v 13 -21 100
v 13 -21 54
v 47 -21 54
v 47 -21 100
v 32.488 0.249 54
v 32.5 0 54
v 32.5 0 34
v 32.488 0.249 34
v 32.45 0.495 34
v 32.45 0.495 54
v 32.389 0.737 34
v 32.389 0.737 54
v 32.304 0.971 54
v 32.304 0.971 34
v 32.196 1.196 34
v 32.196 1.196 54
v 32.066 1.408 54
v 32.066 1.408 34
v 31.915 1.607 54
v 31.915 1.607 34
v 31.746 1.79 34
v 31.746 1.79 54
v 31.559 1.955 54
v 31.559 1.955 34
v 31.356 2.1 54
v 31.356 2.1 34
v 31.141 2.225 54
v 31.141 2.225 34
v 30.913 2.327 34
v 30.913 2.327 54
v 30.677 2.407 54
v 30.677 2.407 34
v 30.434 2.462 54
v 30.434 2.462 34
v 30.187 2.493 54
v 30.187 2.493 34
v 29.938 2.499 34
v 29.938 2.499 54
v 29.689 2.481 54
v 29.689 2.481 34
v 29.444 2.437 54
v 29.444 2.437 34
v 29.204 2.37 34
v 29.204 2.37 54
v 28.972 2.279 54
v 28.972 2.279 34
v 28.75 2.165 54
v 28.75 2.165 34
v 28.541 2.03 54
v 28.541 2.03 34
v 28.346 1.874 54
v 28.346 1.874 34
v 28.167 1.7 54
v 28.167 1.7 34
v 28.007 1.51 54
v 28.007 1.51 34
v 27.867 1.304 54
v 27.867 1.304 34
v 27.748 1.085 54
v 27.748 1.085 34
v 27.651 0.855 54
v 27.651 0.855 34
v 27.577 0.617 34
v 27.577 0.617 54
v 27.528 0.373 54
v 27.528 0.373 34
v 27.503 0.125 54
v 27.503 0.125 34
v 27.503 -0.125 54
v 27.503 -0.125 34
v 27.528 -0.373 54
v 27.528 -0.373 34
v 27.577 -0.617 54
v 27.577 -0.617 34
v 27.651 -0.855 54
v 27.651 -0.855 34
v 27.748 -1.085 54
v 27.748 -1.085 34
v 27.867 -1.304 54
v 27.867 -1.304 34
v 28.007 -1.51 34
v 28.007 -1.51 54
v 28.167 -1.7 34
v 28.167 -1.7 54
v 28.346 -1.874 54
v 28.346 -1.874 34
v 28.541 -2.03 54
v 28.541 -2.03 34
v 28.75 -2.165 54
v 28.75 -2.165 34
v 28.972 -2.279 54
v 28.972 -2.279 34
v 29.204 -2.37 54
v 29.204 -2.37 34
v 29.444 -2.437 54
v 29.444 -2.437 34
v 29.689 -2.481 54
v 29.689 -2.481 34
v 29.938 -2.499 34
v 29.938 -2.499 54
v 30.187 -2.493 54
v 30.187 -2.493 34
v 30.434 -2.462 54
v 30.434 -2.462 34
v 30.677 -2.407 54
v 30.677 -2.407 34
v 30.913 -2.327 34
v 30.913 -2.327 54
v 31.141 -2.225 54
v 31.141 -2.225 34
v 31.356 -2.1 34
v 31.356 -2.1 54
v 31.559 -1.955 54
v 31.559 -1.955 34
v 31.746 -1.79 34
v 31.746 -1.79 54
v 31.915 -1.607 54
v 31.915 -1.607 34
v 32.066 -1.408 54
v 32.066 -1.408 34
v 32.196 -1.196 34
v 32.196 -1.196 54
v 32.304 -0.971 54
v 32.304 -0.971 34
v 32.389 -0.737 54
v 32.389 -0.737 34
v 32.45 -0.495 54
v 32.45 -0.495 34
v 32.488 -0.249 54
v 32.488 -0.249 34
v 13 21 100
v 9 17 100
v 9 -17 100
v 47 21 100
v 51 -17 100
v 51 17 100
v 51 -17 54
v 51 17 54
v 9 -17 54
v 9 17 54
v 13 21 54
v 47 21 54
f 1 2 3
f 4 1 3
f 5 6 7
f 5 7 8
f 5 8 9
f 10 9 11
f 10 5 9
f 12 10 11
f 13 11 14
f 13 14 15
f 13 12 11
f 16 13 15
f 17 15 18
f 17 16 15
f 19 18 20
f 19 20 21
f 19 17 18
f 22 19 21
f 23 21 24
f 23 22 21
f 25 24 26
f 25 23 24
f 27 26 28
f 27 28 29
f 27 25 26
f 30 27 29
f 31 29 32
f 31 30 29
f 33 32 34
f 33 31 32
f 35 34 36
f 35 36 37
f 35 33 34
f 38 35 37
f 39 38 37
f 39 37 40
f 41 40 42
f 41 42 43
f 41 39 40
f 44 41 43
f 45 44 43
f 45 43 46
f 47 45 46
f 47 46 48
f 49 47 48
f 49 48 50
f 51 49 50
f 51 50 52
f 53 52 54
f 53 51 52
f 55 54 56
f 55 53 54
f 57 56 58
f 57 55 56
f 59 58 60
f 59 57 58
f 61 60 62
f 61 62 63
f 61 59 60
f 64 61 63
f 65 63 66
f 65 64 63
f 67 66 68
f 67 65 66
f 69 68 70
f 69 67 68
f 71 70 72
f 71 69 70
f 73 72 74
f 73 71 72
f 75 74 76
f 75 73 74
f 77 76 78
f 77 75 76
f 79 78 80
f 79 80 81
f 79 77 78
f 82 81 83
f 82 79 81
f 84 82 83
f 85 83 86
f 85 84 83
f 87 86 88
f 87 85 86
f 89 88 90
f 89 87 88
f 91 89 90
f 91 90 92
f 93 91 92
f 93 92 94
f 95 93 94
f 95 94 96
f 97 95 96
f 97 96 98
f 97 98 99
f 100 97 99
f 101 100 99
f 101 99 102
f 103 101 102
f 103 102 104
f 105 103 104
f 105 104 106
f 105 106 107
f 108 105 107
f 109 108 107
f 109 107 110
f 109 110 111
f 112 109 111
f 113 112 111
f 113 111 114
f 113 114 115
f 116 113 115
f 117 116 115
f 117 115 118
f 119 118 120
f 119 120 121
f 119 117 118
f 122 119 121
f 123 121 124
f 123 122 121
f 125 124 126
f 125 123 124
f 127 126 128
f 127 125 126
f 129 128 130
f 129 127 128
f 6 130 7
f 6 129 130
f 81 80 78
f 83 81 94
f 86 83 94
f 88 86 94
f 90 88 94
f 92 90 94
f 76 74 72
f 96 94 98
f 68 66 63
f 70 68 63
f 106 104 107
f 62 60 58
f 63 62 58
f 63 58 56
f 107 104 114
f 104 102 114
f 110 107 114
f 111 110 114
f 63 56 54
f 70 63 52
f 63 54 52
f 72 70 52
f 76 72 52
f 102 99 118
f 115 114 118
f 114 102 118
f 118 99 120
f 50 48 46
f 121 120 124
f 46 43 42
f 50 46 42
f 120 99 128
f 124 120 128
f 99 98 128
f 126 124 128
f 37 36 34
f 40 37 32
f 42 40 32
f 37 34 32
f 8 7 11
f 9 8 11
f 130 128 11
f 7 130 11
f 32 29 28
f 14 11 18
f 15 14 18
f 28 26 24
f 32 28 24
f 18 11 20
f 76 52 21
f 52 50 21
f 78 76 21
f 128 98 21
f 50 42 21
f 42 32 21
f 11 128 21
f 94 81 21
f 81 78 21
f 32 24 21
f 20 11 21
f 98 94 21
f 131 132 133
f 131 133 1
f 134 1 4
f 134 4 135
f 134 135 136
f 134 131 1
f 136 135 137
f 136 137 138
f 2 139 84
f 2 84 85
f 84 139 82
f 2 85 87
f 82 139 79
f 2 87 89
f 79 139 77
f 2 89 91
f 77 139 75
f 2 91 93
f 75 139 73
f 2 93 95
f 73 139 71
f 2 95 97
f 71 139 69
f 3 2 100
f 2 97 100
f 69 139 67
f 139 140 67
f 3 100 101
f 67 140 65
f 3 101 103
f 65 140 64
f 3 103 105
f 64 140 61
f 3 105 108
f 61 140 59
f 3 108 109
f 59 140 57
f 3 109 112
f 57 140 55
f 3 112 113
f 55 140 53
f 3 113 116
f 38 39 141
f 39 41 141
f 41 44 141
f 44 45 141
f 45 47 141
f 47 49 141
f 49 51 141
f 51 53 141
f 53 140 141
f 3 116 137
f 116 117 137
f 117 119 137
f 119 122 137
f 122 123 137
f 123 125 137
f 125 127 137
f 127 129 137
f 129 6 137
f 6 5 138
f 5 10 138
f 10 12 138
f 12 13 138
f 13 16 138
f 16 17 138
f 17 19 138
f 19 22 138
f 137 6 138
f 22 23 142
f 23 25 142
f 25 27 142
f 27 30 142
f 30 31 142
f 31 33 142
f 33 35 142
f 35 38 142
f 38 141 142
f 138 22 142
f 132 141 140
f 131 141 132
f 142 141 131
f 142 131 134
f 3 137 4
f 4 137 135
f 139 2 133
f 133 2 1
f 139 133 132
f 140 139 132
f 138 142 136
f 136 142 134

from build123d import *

# Parameters (mm, degrees)
SKETCH_W     = 42
SKETCH_H     = 42
PAD_DEPTH    = 46
CHAMFER_SIZE = 4
SKETCH001_R  = 2.5
PAD001_DEPTH = 20


with BuildPart() as part:
    # Sketch → Pad (new body)
    with BuildSketch(Plane.XY):
        Rectangle(SKETCH_W, SKETCH_H)
    extrude(amount=PAD_DEPTH)

    # Chamfer
    chamfer_edges = [part.edges().sort_by_distance(p)[0] for p in [
        (-21, 21, 23),
        (-21, -21, 23),
        (21, -21, 23),
        (21, 21, 23),
    ]]
    chamfer(chamfer_edges, length=CHAMFER_SIZE)

    # Sketch001 → Pad001 (join)
    with BuildSketch(Plane.XY):
        Circle(SKETCH001_R)
    extrude(amount=-PAD001_DEPTH)


with BuildPart() as part_1:
    # Body placement: moved
    add(part.part.moved(Location((30, 0, 54))))


solid = part_1.part
